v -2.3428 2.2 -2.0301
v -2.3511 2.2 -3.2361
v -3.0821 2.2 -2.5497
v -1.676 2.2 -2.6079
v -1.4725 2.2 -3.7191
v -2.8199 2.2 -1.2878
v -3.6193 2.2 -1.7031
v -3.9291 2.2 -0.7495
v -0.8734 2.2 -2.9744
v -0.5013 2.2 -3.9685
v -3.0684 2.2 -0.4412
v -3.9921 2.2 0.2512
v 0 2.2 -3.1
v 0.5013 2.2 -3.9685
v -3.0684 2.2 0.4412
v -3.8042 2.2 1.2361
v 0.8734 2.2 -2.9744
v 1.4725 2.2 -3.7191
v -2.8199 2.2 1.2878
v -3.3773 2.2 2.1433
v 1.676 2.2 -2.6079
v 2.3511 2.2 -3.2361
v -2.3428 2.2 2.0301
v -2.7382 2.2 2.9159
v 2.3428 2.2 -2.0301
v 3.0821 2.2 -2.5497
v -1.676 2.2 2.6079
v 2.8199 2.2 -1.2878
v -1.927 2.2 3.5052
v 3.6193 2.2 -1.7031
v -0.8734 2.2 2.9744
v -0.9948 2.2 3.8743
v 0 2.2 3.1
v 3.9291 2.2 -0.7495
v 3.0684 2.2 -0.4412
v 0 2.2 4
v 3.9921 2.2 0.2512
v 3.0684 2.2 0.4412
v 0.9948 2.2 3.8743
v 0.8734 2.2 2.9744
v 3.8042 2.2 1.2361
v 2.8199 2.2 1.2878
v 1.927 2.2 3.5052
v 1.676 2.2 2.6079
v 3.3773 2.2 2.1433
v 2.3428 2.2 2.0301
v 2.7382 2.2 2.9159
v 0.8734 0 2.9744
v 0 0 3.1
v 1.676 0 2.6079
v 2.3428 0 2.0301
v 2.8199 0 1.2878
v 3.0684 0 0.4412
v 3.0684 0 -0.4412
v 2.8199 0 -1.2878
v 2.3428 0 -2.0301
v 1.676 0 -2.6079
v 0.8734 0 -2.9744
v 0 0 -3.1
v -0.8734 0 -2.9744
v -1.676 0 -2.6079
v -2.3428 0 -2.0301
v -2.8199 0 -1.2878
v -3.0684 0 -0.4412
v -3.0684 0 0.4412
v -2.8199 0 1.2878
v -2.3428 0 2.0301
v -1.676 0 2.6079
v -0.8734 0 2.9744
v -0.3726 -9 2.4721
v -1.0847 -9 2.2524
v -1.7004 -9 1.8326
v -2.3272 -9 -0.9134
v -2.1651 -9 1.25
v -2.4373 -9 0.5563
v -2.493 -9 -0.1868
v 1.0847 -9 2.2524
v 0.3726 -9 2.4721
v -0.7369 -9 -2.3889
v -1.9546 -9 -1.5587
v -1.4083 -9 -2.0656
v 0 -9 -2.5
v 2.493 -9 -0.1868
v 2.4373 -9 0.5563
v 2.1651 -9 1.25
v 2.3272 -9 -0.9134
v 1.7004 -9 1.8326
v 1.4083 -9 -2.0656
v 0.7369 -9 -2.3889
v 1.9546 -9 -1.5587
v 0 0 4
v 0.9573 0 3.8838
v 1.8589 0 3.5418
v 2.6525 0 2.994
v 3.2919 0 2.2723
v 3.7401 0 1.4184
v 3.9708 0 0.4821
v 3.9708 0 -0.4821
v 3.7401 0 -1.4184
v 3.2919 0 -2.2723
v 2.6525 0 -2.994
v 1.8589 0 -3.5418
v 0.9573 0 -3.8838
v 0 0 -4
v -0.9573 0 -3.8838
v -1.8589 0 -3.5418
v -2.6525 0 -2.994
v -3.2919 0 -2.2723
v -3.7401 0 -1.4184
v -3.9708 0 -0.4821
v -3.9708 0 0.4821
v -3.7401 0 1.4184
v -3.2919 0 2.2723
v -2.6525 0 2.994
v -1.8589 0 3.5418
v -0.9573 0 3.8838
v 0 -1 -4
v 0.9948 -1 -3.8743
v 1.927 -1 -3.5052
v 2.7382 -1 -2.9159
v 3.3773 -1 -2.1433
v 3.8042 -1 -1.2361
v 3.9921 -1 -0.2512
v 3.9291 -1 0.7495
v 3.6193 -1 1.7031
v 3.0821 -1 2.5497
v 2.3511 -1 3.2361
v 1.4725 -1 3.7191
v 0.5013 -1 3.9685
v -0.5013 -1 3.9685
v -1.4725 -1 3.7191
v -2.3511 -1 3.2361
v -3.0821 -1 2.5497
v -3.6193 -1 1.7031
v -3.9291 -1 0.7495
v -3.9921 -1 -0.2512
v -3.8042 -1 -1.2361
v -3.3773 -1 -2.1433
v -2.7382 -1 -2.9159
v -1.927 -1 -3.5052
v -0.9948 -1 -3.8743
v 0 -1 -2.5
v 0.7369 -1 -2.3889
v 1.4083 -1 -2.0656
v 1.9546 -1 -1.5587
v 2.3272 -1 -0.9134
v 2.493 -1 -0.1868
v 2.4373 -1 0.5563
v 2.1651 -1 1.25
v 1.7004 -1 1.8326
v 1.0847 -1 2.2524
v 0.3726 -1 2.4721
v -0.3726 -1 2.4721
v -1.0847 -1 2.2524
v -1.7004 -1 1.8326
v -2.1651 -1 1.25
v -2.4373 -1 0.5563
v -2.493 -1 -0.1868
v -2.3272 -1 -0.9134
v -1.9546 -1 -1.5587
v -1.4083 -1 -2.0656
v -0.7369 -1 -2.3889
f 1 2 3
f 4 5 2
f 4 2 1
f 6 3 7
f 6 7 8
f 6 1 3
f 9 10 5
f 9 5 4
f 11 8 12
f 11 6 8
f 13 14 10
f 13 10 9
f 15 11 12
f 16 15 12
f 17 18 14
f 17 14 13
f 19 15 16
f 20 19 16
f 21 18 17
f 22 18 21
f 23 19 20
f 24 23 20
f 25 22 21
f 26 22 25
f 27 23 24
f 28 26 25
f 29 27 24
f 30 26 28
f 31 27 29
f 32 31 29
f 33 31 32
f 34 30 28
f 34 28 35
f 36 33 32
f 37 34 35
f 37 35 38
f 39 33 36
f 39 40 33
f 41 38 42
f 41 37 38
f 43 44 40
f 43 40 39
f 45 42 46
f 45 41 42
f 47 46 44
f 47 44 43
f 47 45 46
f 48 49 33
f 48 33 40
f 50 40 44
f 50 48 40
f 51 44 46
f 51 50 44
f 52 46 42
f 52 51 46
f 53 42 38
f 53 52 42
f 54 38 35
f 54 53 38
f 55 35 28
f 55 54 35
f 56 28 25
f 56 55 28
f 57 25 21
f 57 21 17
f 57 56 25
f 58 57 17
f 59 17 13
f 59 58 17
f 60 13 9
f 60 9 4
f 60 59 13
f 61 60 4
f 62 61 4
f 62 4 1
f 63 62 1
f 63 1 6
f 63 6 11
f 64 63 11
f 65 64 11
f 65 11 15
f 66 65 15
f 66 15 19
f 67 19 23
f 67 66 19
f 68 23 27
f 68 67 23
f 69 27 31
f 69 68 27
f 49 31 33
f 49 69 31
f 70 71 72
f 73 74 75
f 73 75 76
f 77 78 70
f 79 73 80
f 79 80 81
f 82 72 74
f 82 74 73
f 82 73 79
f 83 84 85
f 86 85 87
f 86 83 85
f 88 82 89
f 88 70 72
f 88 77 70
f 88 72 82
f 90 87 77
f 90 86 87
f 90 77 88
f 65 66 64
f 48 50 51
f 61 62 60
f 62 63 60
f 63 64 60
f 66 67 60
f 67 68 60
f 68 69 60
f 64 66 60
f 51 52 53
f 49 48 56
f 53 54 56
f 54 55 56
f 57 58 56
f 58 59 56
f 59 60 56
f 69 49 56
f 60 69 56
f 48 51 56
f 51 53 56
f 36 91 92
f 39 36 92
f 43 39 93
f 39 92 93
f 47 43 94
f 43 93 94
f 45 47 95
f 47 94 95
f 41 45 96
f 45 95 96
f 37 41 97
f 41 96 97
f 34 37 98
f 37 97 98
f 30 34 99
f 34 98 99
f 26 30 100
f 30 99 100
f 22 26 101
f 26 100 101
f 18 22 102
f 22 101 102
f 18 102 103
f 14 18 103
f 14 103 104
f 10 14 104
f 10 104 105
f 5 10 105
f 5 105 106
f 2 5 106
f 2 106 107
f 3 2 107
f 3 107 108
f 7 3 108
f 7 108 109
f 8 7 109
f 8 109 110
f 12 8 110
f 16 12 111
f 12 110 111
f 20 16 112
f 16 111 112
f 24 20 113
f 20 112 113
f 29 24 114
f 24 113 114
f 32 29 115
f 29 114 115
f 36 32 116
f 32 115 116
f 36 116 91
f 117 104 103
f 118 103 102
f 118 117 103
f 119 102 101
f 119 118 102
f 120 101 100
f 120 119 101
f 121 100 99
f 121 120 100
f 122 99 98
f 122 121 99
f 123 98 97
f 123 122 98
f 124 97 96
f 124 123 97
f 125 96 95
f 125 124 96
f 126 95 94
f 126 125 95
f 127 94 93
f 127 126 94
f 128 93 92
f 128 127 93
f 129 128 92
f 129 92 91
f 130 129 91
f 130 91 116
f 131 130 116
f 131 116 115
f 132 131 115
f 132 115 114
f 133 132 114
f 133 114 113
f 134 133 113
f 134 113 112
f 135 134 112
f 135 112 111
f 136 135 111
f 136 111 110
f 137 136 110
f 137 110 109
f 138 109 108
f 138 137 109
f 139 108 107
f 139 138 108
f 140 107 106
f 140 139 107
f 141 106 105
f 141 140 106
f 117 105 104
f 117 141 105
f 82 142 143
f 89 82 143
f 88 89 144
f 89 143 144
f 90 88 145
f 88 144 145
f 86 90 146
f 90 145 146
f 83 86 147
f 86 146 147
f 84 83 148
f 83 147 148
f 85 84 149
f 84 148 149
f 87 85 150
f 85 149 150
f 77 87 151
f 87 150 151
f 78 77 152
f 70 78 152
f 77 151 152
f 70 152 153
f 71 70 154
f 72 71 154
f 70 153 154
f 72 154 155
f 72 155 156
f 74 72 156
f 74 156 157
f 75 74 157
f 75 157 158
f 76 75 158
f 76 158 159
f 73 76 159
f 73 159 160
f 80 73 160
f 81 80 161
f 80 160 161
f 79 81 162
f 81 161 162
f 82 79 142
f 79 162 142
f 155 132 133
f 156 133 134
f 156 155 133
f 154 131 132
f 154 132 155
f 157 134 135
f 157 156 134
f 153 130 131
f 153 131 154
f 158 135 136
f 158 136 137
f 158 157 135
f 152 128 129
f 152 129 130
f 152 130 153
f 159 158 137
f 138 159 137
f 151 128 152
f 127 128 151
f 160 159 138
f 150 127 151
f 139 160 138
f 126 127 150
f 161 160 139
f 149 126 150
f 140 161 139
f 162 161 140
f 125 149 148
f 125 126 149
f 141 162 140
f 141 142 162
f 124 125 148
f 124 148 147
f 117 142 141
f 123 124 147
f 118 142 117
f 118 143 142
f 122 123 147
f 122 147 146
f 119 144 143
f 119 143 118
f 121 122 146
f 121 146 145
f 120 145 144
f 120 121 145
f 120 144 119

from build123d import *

# Parameters (mm, degrees)
ESQUISSE1_R        = 4
ESQUISSE1_R_2      = 3.1
BOSS_EXTRU_1_DEPTH = 2.2
BOSS_EXTRU_2_START = 1
ESQUISSE2_R        = 4
BOSS_EXTRU_2_DEPTH = 1
ESQUISSE3_R        = 2.5
BOSS_EXTRU_3_DEPTH = 8


with BuildPart() as part:
    # Esquisse1 → Boss.-Extru.1 (new body)
    with BuildSketch(Plane(origin=(0, 0, 0), x_dir=(1, 0, 0), z_dir=(0, 1, 0))):
        with Locations(Location((0, 0, 0), (0, 0, 270))):
            Circle(ESQUISSE1_R)
        with Locations(Location((0, 0, 0), (0, 0, 270))):
            Circle(ESQUISSE1_R_2, mode=Mode.SUBTRACT)
    extrude(amount=BOSS_EXTRU_1_DEPTH)

    # Esquisse2 → Boss.-Extru.2 (add)
    with BuildSketch(Plane.XZ.offset(BOSS_EXTRU_2_START)):
        with Locations(Location((0, 0, 0), (0, 0, 270))):
            Circle(ESQUISSE2_R)
    extrude(amount=-BOSS_EXTRU_2_DEPTH)

    # Esquisse3 → Boss.-Extru.3 (add)
    with BuildSketch(Plane.XZ.offset(1)):
        with Locations(Location((0, 0, 0), (0, 0, 270))):
            Circle(ESQUISSE3_R)
    extrude(amount=BOSS_EXTRU_3_DEPTH)


solid = part.part
